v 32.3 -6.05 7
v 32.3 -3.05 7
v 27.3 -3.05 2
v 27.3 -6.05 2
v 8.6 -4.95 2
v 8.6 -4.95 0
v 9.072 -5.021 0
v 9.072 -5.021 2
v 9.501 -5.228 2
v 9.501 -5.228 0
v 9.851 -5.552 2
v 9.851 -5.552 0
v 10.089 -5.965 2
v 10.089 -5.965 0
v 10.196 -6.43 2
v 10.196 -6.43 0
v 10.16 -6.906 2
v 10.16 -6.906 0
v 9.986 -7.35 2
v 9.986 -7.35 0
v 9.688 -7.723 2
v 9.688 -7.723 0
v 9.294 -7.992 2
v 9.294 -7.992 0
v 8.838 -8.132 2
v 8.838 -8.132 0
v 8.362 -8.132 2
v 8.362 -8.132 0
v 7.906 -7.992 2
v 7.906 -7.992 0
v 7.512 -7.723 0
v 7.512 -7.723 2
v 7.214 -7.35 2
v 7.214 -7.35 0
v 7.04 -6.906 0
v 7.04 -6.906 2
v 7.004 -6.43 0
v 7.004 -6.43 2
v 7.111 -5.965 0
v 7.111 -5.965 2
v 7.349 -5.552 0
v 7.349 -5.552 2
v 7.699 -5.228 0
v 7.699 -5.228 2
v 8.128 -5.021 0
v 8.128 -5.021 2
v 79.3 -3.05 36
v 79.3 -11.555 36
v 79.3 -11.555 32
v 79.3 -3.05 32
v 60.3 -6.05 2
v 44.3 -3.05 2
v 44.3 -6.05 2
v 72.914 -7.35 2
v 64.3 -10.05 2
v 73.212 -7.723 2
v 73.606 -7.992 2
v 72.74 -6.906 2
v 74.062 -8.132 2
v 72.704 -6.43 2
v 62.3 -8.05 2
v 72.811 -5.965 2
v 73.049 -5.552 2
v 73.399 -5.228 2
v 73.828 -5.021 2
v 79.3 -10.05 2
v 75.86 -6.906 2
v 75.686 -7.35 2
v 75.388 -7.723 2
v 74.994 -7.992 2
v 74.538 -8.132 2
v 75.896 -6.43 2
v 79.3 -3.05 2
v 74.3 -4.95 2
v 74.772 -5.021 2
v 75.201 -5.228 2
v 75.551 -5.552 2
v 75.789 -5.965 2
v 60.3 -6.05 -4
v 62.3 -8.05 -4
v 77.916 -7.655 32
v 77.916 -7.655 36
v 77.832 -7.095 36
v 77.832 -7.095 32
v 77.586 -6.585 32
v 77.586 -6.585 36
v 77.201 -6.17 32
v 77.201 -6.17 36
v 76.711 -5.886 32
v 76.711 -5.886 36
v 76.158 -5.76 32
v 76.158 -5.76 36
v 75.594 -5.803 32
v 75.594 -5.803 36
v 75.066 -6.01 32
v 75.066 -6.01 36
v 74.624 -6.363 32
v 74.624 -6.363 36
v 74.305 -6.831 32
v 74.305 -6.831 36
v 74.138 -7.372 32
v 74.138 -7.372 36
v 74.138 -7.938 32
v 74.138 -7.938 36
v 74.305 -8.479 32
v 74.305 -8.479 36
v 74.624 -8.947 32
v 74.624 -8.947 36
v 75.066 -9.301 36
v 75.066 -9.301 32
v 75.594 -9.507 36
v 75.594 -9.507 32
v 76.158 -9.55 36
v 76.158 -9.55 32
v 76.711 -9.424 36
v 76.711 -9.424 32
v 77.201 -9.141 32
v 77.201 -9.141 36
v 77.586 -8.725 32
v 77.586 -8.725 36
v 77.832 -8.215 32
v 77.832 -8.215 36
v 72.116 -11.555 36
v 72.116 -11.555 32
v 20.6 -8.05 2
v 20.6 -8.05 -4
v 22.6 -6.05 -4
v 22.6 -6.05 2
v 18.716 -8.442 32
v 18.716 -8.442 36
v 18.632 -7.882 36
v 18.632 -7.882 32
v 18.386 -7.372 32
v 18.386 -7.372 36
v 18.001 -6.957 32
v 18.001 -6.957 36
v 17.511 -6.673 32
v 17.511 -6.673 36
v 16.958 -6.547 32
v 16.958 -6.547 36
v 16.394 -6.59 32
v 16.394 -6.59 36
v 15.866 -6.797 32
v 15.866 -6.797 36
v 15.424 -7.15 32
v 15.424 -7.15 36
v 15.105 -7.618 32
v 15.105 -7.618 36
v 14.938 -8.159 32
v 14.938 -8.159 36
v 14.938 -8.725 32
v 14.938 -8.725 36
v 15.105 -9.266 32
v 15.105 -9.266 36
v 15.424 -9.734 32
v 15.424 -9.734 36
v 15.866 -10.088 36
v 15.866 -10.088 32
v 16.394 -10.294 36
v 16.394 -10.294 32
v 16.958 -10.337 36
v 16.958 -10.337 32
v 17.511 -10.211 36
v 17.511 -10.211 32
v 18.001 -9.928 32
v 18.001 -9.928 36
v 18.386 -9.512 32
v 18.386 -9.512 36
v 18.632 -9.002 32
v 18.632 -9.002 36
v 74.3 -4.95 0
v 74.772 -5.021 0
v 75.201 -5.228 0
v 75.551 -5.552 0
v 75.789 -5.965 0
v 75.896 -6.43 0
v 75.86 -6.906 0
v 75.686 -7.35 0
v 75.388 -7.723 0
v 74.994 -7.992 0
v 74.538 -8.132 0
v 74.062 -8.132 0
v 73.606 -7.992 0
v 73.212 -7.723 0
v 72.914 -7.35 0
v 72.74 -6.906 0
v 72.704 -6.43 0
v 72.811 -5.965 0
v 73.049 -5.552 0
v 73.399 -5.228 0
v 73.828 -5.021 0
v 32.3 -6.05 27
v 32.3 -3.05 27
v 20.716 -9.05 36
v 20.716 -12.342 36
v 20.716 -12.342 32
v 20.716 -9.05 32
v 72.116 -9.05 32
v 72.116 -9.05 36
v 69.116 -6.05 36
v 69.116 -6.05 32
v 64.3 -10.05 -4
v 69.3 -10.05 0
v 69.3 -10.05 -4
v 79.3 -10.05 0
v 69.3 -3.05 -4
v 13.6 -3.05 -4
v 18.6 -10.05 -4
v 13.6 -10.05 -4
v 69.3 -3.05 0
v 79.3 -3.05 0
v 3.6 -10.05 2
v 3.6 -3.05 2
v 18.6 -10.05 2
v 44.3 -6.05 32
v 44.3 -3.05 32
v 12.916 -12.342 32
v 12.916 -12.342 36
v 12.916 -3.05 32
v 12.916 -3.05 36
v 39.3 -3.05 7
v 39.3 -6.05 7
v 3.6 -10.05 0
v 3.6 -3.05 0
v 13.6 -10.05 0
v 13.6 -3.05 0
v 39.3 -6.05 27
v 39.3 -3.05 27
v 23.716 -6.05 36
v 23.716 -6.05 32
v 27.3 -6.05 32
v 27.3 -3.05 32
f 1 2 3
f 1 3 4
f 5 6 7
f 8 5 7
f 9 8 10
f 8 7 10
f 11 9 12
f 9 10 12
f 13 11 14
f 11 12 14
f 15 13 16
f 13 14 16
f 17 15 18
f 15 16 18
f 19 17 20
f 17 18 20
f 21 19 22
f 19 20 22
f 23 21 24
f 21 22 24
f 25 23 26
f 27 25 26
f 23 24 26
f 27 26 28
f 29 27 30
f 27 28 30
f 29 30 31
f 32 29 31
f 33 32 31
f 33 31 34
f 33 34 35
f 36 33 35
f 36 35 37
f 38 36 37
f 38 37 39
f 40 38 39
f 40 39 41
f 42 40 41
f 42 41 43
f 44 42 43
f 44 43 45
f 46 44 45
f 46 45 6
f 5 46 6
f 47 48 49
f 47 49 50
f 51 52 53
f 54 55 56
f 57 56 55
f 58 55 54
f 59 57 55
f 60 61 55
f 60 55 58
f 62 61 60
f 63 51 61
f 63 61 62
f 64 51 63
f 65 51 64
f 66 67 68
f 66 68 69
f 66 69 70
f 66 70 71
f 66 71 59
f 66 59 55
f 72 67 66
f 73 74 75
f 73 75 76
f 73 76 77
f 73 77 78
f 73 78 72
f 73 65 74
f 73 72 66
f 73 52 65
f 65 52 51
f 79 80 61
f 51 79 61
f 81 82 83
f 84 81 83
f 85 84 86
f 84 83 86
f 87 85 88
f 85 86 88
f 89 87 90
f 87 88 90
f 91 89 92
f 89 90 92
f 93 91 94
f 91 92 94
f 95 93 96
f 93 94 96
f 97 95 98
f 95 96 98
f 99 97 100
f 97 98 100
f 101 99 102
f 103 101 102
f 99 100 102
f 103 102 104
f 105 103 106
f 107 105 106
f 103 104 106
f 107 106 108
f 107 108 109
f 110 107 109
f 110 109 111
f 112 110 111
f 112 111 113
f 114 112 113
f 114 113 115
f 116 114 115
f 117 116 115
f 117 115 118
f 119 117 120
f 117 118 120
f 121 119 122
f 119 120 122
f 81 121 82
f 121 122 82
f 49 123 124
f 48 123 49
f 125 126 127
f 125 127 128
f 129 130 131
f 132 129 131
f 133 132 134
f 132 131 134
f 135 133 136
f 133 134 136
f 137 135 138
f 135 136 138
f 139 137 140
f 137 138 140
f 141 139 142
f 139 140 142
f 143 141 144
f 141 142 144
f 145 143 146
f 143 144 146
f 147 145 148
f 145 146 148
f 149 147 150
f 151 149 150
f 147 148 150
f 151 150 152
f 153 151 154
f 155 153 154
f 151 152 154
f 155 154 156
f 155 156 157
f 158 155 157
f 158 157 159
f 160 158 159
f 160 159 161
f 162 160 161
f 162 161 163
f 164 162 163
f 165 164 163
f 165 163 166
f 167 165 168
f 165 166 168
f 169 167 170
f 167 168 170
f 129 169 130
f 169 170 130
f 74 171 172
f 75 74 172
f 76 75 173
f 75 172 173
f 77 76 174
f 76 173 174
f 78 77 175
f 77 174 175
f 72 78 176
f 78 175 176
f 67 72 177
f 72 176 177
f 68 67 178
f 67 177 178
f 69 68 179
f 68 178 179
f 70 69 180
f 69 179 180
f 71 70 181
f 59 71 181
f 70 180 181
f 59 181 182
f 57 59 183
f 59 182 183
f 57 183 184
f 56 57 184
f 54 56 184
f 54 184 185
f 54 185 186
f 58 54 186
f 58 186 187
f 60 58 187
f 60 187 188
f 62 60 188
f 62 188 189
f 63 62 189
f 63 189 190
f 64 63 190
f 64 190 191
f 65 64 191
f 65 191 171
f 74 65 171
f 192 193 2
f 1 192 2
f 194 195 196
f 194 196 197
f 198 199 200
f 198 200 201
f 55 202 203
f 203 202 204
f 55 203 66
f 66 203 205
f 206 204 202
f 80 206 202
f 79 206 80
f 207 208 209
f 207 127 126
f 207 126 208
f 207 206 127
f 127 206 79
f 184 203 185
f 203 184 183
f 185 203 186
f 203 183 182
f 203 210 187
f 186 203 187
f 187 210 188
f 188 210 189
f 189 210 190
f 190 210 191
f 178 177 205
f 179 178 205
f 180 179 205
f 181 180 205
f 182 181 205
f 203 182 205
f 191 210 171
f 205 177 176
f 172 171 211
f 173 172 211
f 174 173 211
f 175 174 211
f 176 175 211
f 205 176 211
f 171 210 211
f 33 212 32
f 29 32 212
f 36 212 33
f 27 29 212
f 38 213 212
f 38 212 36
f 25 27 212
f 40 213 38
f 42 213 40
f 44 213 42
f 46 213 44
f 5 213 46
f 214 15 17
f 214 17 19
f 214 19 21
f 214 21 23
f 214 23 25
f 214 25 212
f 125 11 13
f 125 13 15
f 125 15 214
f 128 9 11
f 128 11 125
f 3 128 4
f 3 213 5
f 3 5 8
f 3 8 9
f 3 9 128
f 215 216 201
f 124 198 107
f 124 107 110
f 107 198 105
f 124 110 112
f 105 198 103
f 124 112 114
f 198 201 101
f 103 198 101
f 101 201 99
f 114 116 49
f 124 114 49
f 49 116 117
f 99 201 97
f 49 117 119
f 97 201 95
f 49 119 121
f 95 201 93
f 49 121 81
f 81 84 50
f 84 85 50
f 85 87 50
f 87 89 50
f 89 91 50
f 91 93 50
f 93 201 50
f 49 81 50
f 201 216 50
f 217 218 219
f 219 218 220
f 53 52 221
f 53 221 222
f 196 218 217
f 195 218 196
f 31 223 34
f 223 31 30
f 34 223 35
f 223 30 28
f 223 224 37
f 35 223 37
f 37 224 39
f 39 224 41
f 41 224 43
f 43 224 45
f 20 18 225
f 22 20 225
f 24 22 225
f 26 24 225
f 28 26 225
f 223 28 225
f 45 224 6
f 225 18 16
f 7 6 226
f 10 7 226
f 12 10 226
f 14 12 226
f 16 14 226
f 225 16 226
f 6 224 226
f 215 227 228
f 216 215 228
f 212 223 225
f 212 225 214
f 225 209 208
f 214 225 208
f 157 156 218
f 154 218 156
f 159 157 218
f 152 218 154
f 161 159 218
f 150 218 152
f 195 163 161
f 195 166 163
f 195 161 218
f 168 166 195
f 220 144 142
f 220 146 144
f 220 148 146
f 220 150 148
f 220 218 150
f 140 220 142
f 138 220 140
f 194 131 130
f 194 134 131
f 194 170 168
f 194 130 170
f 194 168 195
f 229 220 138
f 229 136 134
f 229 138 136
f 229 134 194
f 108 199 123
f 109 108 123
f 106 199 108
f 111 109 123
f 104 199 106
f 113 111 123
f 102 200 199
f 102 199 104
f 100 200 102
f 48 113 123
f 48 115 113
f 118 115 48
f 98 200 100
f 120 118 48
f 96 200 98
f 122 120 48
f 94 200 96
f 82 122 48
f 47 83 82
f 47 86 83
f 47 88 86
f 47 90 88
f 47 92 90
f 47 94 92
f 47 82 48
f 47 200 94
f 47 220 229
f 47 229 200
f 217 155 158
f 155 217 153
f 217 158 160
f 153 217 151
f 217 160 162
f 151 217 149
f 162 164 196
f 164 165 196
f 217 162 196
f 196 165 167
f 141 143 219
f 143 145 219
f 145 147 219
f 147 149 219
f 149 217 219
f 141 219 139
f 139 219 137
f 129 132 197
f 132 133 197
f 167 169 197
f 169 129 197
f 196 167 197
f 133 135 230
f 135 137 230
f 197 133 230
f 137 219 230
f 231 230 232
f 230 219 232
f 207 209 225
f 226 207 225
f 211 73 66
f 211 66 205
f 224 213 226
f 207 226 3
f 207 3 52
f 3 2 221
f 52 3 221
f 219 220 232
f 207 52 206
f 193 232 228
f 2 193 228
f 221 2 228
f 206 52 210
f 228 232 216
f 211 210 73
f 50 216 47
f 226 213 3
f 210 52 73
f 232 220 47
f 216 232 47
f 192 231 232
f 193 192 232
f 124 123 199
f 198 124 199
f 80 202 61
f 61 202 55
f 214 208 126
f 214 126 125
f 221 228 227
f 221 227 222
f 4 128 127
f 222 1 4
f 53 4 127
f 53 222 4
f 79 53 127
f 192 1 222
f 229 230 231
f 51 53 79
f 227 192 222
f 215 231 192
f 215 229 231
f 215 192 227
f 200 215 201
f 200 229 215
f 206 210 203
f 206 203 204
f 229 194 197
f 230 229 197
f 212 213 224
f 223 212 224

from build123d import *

# Parameters (mm, degrees)
SKETCH2_W           = 10
SKETCH2_H           = 2
SKETCH2_W_2         = 7
SKETCH2_H_2         = 34
BOSS_EXTRUDE1_DEPTH = 7
CUT_EXTRUDE1_REACH  = 91.384
SKETCH4_W           = 41.7
SKETCH4_H           = 4
SKETCH6_W           = 11.583545394
SKETCH6_H           = 3
SKETCH6_W_2         = 32.816454606
SKETCH6_W_3         = 7.183545394
SKETCH6_H_2         = 8.505079478
SKETCH6_R           = 1.9
SKETCH6_W_4         = 7.8
SKETCH6_H_3         = 9.292079478
BOSS_EXTRUDE2_DEPTH = 4
CHAMFER1_SIZE       = 5
CHAMFER2_SIZE       = 3
CHAMFER7_SIZE       = 2
SKETCH7_R           = 1.6
CUT_EXTRUDE2_DEPTH  = 3.5


with BuildPart() as part:
    # Sketch2 → Boss-Extrude1 (new body)
    with BuildSketch(Plane(origin=(0, -3.05, 0), x_dir=(1, 0, 0), z_dir=(0, 1, 0))):
        with Locations((74.3, -1)):
            Rectangle(SKETCH2_W, SKETCH2_H)
        Polygon((69.3, -2), (69.3, 0), (69.3, 4), (13.6, 4), (13.6, 0), (13.6, -2), (32.3, -2), (39.3, -2), align=None)
        with Locations((35.8, -19)):
            Rectangle(SKETCH2_W_2, SKETCH2_H_2)
        with Locations((8.6, -1)):
            Rectangle(SKETCH2_W, SKETCH2_H)
    extrude(amount=-BOSS_EXTRUDE1_DEPTH)

    # Cut-Extrude1: up to this face of the body (flat: up to its plane)
    cut_extrude1_end = Plane(part.part.faces().sort_by_distance((35.8, -6.55, 36))[0])
    # Sketch4 → Cut-Extrude1 (cut, up to the picked face)
    with BuildSketch(Plane(origin=(0, 0, -4), x_dir=(-1, 0, 0), z_dir=(0, 0, -1)), mode=Mode.PRIVATE) as cut_extrude1_sk1:
        with Locations((-41.45, -8.05)):
            Rectangle(SKETCH4_W, SKETCH4_H)
    cut_extrude1_tool1 = split(extrude(cut_extrude1_sk1.sketch, amount=-CUT_EXTRUDE1_REACH, mode=Mode.PRIVATE), bisect_by=cut_extrude1_end, keep=Keep.BOTH, mode=Mode.PRIVATE)
    add(cut_extrude1_tool1.solids().sort_by(Axis((41.45, -8.05, -4), (0, 0, 1)))[0], mode=Mode.SUBTRACT)

    # Sketch6 → Boss-Extrude2 (add)
    # profile 1 of 4: a face of its own
    with BuildSketch(Plane.XY.offset(36)):
        with Locations((26.508227303, -4.55)):
            Rectangle(SKETCH6_W, SKETCH6_H)
    # profile 2 of 4: a face of its own
    with BuildSketch(Plane.XY.offset(36)):
        with Locations((55.708227303, -4.55)):
            Rectangle(SKETCH6_W_2, SKETCH6_H)
    # profile 3 of 4: a face of its own
    with BuildSketch(Plane.XY.offset(36)):
        with Locations((75.708227303, -7.302539739)):
            Rectangle(SKETCH6_W_3, SKETCH6_H_2)
        with Locations((76.016454606, -7.655079478)):
            Circle(SKETCH6_R, mode=Mode.SUBTRACT)
    # profile 4 of 4: a face of its own
    with BuildSketch(Plane.XY.offset(36)):
        with Locations((16.816454606, -7.696039739)):
            Rectangle(SKETCH6_W_4, SKETCH6_H_3)
        with Locations((16.816454606, -8.442079478)):
            Circle(SKETCH6_R, mode=Mode.SUBTRACT)
    extrude(amount=-BOSS_EXTRUDE2_DEPTH)

    # Chamfer1
    chamfer1_edges = [part.edges().sort_by_distance(p)[0] for p in [
        (39.3, -4.55, 2),
        (32.3, -4.55, 2),
        (39.3, -4.55, 32),
        (32.3, -4.55, 32),
    ]]
    chamfer(chamfer1_edges, length=CHAMFER1_SIZE)

    # Chamfer2
    chamfer2_edges = [part.edges().sort_by_distance(p)[0] for p in [
        (72.116454606, -6.05, 34),
        (20.716454606, -6.05, 34),
    ]]
    chamfer(chamfer2_edges, length=CHAMFER2_SIZE)

    # Chamfer7
    chamfer7_edges = [part.edges().sort_by_distance(p)[0] for p in [
        (62.3, -6.05, -1),
        (20.6, -6.05, -1),
    ]]
    chamfer(chamfer7_edges, length=CHAMFER7_SIZE)
    chamfer7_2_edges = [part.edges().sort_by_distance(p)[0] for p in [
        (62.3, -10.05, -1),
        (20.6, -10.05, -1),
    ]]
    chamfer(chamfer7_2_edges, length=CHAMFER7_SIZE - 0.0001)  # a hair under: the kernel refuses the full size

    # Sketch7 → Cut-Extrude2 (cut)
    with BuildSketch(Plane(origin=(0, 0, 0), x_dir=(-1, 0, 0), z_dir=(0, 0, -1))):
        with Locations(Location((-74.3, -6.55, 0), (0, 0, 90))):
            Circle(SKETCH7_R)
        with Locations(Location((-8.6, -6.55, 0), (0, 0, 90))):
            Circle(SKETCH7_R)
    extrude(amount=-CUT_EXTRUDE2_DEPTH, mode=Mode.SUBTRACT)


solid = part.part
